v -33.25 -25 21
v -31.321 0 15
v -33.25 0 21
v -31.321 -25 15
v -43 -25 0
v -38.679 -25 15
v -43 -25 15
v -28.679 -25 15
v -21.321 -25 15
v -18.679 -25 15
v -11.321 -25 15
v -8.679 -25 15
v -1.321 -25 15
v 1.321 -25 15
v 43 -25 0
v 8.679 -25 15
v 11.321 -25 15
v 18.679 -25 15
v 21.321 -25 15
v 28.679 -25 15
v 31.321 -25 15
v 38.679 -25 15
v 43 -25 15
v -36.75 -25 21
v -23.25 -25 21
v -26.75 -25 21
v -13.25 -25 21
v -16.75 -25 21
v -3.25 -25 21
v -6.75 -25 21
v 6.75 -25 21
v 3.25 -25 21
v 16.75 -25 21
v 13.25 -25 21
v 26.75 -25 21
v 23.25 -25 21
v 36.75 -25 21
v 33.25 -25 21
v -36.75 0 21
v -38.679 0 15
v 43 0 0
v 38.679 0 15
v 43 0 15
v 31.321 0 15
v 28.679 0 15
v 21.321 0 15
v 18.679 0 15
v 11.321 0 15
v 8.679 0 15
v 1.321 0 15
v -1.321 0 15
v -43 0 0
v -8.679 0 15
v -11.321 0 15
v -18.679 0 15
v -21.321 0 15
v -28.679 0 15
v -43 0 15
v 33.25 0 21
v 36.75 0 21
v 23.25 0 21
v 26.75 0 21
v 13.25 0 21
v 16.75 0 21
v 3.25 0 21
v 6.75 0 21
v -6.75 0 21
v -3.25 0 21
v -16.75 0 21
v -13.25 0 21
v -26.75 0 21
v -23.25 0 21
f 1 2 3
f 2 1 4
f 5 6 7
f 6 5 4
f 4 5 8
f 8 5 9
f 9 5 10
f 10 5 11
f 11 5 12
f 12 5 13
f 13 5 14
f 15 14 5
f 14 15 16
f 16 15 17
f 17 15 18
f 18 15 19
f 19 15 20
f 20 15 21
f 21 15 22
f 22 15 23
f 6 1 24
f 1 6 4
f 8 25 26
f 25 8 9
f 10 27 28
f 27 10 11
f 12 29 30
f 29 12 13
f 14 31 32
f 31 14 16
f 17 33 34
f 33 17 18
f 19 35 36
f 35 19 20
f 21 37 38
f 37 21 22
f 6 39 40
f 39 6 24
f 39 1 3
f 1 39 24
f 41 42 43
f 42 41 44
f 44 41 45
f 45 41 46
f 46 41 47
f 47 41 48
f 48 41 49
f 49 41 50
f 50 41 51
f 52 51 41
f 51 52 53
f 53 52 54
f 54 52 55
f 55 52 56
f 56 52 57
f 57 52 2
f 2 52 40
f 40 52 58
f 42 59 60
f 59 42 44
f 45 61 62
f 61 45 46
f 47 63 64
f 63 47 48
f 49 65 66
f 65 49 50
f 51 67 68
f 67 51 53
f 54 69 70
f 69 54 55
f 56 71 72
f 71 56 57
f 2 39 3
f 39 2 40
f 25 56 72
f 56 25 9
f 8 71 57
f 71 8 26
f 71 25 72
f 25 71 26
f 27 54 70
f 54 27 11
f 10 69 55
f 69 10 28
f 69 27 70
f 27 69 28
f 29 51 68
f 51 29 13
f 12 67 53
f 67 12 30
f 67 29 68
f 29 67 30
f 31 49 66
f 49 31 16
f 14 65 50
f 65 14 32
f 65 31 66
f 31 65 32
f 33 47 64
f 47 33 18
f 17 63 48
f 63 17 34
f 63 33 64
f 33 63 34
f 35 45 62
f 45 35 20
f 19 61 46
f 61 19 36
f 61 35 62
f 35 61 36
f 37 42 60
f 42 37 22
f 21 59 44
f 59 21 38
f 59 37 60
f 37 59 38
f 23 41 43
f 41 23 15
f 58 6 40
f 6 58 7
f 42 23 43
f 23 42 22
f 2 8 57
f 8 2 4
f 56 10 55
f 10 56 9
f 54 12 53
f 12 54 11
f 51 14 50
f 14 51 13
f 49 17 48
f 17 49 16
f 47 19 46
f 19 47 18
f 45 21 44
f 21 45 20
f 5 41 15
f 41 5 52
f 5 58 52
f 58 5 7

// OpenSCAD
$fn = 32;

// ----------------------------------------------------------------------
// Toothed rack, 8 teeth
// 10 mm pitch, 6 mm teeth
// ----------------------------------------------------------------------

// --- parameters (mm) ---
bar_w = 25;     // bar width (Y)
bar_h = 15;     // bar height (Z)
teeth = 8;      // number of teeth
pitch = 10;     // tooth pitch
tooth_h = 6;    // tooth height above the bar
root_w = 8;     // tooth width at the root
crest_w = 3.5;  // tooth width at the crest

// --- derived feature positions (mm) ---
span = (teeth - 1) * pitch;  // = 70   distance between the outer teeth
bar_l = span + root_w + 8;   // = 86   bar length: teeth plus 4 mm at each end
tooth_x = -span / 2;         // = -35   X of the first tooth
height = bar_h + tooth_h;    // = 21   overall height
feature_centers = [
  [tooth_x + 0 * pitch, -bar_w / 2],
  [tooth_x + 1 * pitch, -bar_w / 2],
  [tooth_x + 2 * pitch, -bar_w / 2],
  [tooth_x + 3 * pitch, -bar_w / 2],
  [tooth_x + 4 * pitch, -bar_w / 2],
  [tooth_x + 5 * pitch, -bar_w / 2],
  [tooth_x + 6 * pitch, -bar_w / 2],
  [tooth_x + 7 * pitch, -bar_w / 2]
];   // tooth centre line, drives the tooth loop

// bar with a rack of teeth, one extruded trapezoium per centre
module rack_tooth() {
  linear_extrude(height = bar_w)
    polygon(points = [
      [0, 0],
      [root_w, 0],
      [root_w / 2 + crest_w / 2, tooth_h + 1],
      [root_w / 2 - crest_w / 2, tooth_h + 1]
    ]);
}

union() {
  translate([-bar_l / 2, -bar_w, 0]) cube([bar_l, bar_w, bar_h]);
  for (centre = feature_centers)
    translate([centre[0] - root_w / 2, 0, bar_h - 1]) rotate([90, 0, 0]) rack_tooth();
}
